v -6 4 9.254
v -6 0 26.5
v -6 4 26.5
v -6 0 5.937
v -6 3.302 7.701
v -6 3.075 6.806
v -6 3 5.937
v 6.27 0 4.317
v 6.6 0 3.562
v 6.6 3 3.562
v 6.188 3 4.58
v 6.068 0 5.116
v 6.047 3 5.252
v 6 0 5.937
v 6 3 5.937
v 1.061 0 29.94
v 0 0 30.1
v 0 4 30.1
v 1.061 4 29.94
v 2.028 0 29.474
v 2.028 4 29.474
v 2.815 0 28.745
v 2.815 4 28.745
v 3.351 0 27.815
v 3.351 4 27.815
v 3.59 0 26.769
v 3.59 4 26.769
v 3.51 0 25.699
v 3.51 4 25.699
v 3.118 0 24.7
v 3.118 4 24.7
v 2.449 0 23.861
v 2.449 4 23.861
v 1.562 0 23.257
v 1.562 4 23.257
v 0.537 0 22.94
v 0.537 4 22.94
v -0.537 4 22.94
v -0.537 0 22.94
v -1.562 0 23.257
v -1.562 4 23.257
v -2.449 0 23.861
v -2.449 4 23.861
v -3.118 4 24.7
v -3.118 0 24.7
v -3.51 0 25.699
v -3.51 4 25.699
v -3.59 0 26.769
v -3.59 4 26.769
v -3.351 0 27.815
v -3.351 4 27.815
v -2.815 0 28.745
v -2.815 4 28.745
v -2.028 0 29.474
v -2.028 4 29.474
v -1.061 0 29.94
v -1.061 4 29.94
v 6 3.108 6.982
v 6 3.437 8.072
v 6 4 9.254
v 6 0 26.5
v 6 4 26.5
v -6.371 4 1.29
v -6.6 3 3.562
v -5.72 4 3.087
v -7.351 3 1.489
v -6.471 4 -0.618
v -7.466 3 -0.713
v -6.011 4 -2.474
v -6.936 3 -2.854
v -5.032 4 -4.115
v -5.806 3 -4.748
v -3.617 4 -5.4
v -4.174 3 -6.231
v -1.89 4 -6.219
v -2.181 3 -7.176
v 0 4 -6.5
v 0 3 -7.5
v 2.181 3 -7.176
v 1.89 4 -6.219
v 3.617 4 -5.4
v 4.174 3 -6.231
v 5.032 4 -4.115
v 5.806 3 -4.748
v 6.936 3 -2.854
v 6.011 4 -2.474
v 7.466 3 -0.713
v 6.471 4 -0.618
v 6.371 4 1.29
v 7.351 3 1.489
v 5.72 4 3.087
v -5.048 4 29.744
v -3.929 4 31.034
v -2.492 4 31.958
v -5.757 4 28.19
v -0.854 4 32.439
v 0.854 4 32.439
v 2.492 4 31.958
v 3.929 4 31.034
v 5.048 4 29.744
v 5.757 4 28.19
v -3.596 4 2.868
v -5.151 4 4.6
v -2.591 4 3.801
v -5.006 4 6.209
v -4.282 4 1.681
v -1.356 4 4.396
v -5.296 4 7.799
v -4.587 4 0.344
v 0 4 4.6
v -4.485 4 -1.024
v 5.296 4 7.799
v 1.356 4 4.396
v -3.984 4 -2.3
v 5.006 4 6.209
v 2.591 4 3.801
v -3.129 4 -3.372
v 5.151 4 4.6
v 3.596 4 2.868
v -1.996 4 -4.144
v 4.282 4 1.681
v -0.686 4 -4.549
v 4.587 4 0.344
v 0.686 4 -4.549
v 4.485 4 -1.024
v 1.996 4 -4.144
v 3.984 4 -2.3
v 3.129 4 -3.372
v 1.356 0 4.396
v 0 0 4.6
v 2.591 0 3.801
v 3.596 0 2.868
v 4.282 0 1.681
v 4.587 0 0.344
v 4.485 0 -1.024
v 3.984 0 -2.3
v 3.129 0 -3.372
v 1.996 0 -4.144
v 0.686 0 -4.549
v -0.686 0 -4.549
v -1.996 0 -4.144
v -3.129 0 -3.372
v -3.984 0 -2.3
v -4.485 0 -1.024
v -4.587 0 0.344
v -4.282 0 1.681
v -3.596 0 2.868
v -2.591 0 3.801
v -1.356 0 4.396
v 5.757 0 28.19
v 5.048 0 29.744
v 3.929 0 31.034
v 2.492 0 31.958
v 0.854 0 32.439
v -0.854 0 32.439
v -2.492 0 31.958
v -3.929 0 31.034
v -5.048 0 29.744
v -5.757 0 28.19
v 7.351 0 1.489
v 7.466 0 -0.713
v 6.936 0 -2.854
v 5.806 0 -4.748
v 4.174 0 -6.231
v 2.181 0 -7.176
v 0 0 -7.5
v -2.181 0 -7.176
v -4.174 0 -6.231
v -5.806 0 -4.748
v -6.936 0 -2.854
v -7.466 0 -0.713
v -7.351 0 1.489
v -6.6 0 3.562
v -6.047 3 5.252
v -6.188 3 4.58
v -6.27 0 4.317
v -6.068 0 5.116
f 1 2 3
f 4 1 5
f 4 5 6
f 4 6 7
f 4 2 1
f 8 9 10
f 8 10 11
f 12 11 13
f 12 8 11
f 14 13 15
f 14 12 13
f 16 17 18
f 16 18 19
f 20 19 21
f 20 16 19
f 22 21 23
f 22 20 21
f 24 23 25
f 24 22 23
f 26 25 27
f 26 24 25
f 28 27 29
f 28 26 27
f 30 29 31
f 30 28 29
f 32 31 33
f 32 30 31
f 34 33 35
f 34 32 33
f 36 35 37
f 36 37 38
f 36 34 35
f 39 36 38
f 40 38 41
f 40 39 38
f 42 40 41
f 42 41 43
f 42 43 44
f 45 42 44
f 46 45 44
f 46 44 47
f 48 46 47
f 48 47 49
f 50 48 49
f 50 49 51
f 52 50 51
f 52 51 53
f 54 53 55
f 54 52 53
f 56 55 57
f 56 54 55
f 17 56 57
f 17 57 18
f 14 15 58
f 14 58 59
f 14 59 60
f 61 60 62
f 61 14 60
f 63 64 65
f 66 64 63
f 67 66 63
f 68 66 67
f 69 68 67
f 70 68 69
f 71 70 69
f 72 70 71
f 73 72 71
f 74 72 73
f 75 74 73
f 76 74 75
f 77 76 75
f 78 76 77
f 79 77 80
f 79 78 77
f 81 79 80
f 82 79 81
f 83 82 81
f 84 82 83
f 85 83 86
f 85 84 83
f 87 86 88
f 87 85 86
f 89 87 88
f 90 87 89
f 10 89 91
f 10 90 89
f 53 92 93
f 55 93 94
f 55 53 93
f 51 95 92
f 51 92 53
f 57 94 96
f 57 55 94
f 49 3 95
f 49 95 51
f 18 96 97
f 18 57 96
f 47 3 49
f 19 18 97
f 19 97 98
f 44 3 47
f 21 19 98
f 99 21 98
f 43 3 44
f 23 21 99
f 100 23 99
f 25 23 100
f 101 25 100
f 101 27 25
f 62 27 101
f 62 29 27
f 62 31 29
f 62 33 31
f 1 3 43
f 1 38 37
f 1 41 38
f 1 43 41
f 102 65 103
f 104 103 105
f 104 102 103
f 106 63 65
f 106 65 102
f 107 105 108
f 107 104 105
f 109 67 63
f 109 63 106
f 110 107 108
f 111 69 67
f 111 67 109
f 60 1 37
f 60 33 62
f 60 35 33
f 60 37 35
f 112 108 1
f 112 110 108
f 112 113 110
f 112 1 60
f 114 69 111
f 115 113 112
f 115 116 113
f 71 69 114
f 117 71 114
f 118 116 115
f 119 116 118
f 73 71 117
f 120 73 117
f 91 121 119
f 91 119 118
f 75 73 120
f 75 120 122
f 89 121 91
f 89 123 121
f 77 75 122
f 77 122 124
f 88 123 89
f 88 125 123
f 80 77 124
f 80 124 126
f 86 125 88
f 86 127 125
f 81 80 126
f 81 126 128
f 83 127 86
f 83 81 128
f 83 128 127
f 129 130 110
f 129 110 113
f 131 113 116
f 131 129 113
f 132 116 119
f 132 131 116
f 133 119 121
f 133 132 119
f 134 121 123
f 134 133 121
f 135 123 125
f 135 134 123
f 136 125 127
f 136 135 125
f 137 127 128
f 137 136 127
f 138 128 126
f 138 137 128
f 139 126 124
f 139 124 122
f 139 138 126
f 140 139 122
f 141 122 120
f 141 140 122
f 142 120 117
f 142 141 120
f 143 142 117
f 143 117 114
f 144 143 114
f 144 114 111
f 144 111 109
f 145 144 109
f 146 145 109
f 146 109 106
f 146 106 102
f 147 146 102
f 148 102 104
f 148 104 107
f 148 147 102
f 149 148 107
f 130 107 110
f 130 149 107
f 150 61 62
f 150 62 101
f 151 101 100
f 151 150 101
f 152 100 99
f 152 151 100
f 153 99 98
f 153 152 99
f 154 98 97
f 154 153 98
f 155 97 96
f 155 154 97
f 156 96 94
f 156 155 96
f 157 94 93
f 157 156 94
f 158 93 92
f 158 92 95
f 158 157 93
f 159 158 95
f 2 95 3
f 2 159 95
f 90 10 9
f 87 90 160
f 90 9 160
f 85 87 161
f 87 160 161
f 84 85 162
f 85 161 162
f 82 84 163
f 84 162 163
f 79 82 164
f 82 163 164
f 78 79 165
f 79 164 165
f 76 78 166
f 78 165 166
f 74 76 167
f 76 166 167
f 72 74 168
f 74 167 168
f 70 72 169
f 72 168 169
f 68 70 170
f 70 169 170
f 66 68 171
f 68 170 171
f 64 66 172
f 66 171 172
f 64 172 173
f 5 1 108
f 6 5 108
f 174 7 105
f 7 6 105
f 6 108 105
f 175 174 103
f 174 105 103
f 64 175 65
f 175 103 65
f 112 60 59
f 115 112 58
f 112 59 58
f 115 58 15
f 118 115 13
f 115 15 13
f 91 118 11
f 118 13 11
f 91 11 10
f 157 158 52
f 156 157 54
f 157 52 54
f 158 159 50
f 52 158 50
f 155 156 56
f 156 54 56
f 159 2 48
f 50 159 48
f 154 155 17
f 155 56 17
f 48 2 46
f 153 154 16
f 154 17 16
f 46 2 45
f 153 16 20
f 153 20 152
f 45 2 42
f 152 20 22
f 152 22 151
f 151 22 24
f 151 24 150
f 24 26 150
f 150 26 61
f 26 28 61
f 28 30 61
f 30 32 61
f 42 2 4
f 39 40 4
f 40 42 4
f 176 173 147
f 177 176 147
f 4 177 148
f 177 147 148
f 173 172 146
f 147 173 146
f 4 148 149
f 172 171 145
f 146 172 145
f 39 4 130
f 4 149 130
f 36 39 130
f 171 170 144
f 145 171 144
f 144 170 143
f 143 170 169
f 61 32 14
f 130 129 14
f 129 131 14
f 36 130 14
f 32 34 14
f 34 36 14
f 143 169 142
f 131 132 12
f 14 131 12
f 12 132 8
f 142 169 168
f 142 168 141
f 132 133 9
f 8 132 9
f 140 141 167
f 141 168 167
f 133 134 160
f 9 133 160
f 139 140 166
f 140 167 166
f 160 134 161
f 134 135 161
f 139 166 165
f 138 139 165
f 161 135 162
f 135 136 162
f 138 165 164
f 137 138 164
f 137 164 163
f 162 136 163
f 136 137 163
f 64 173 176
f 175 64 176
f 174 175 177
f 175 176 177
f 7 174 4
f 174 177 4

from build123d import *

# Parameters (mm, degrees)
SKETCH1_R           = 4.6
SKETCH1_R_2         = 3.6
BOSS_EXTRUDE1_DEPTH = 4
BOSS_EXTRUDE2_START = -4
SKETCH2_R           = 7.5
SKETCH2_R_2         = 4.6
BOSS_EXTRUDE2_DEPTH = 4
FILLET1_R           = 5


with BuildPart() as part:
    # Sketch1 → Boss-Extrude1 (new body)
    with BuildSketch(Plane(origin=(0, 0, 0), x_dir=(1, 0, 0), z_dir=(0, 1, 0))):
        with BuildLine():
            Line((6, 0), (6, -26.5))
            ThreePointArc((6, -26.5), (0, -32.5), (-6, -26.5))
            Line((-6, -26.5), (-6, 0))
            ThreePointArc((-6, 0), (0, 6), (6, 0))
        make_face()
        with Locations(Location((0, 0, 0), (0, 0, 270))):
            Circle(SKETCH1_R, mode=Mode.SUBTRACT)
        with Locations(Location((0, -26.5, 0), (0, 0, 270))):
            Circle(SKETCH1_R_2, mode=Mode.SUBTRACT)
    extrude(amount=BOSS_EXTRUDE1_DEPTH)

    # Sketch2 → Boss-Extrude2 (add)
    with BuildSketch(Plane(origin=(0, 4, 0), x_dir=(1, 0, 0), z_dir=(0, 1, 0)).offset(BOSS_EXTRUDE2_START)):
        Circle(SKETCH2_R)
        with Locations(Location((0, 0, 0), (0, 0, 270))):
            Circle(SKETCH2_R_2, mode=Mode.SUBTRACT)
    extrude(amount=BOSS_EXTRUDE2_DEPTH)

    # Fillet1
    fillet1_edges = [part.edges().sort_by_distance(p)[0] for p in [
        (6, 2, 4.5),
        (-6, 2, 4.5),
    ]]
    fillet(fillet1_edges, radius=FILLET1_R)

    # Chamfer2
    # the kernel refuses this chamfer: 1 mm, written as the material it takes off along each edge
    with BuildSketch(Plane(origin=(0, 4, 0), x_dir=(-0.8800000000000001, 0, 0.47497368348151653), z_dir=(0.47497368348151653, 0, 0.8800000000000001))) as chamfer2_piece_1:
        with BuildLine():
            Line((6.471715729, -0.028284271), (7.528284271, 1.028284271))
            Line((7.528284271, 1.028284271), (7.548284271, 1.028284271))
            ThreePointArc((7.548284271, 1.028284271), (7.52, 0.514142136), (7.52, 0))
            Line((7.52, 0), (7.5, -0.02))
            ThreePointArc((7.5, -0.02), (6.985857864, -0.02), (6.471715729, -0.048284271))
            Line((6.471715729, -0.048284271), (6.471715729, -0.028284271))
        make_face()
    revolve(axis=Axis((0, 4, 0), (0, -1, 0)), revolution_arc=236.715273153, mode=Mode.SUBTRACT)
    with BuildSketch(Plane(origin=(11, 4, 5.937171044), x_dir=(-0.33003370038362406, 0, 0.9439691502433181), z_dir=(0.9439691502433181, 0, 0.33003370038362406))) as chamfer2_piece_2:
        with BuildLine():
            Line((6.028284271, -0.028284271), (4.971715729, 1.028284271))
            Line((4.971715729, 1.028284271), (4.951715729, 1.028284271))
            ThreePointArc((4.951715729, 1.028284271), (4.98, 0.514142136), (4.98, 0))
            Line((4.98, 0), (5, -0.02))
            ThreePointArc((5, -0.02), (5.514142136, -0.02), (6.028284271, -0.048284271))
            Line((6.028284271, -0.048284271), (6.028284271, -0.028284271))
        make_face()
    revolve(axis=Axis((11, 4, 5.937171044), (0, -1, 0)), revolution_arc=99.086815597, mode=Mode.SUBTRACT)
    with BuildSketch(Plane(origin=(-11, 4, 5.937171044), x_dir=(0.3300337003836236, 0, 0.9439691502433183), z_dir=(-0.9439691502433183, 0, 0.3300337003836236))) as chamfer2_piece_3:
        with BuildLine():
            Line((4.971715729, -1.028284271), (6.028284271, 0.028284271))
            Line((6.028284271, 0.028284271), (6.028284271, 0.048284271))
            ThreePointArc((6.028284271, 0.048284271), (5.514142136, 0.02), (5, 0.02))
            Line((5, 0.02), (4.98, 0))
            ThreePointArc((4.98, 0), (4.98, -0.514142136), (4.951715729, -1.028284271))
            Line((4.951715729, -1.028284271), (4.971715729, -1.028284271))
        make_face()
    revolve(axis=Axis((-11, 4, 5.937171044), (0, 1, 0)), revolution_arc=99.086815597, mode=Mode.SUBTRACT)


solid = part.part
